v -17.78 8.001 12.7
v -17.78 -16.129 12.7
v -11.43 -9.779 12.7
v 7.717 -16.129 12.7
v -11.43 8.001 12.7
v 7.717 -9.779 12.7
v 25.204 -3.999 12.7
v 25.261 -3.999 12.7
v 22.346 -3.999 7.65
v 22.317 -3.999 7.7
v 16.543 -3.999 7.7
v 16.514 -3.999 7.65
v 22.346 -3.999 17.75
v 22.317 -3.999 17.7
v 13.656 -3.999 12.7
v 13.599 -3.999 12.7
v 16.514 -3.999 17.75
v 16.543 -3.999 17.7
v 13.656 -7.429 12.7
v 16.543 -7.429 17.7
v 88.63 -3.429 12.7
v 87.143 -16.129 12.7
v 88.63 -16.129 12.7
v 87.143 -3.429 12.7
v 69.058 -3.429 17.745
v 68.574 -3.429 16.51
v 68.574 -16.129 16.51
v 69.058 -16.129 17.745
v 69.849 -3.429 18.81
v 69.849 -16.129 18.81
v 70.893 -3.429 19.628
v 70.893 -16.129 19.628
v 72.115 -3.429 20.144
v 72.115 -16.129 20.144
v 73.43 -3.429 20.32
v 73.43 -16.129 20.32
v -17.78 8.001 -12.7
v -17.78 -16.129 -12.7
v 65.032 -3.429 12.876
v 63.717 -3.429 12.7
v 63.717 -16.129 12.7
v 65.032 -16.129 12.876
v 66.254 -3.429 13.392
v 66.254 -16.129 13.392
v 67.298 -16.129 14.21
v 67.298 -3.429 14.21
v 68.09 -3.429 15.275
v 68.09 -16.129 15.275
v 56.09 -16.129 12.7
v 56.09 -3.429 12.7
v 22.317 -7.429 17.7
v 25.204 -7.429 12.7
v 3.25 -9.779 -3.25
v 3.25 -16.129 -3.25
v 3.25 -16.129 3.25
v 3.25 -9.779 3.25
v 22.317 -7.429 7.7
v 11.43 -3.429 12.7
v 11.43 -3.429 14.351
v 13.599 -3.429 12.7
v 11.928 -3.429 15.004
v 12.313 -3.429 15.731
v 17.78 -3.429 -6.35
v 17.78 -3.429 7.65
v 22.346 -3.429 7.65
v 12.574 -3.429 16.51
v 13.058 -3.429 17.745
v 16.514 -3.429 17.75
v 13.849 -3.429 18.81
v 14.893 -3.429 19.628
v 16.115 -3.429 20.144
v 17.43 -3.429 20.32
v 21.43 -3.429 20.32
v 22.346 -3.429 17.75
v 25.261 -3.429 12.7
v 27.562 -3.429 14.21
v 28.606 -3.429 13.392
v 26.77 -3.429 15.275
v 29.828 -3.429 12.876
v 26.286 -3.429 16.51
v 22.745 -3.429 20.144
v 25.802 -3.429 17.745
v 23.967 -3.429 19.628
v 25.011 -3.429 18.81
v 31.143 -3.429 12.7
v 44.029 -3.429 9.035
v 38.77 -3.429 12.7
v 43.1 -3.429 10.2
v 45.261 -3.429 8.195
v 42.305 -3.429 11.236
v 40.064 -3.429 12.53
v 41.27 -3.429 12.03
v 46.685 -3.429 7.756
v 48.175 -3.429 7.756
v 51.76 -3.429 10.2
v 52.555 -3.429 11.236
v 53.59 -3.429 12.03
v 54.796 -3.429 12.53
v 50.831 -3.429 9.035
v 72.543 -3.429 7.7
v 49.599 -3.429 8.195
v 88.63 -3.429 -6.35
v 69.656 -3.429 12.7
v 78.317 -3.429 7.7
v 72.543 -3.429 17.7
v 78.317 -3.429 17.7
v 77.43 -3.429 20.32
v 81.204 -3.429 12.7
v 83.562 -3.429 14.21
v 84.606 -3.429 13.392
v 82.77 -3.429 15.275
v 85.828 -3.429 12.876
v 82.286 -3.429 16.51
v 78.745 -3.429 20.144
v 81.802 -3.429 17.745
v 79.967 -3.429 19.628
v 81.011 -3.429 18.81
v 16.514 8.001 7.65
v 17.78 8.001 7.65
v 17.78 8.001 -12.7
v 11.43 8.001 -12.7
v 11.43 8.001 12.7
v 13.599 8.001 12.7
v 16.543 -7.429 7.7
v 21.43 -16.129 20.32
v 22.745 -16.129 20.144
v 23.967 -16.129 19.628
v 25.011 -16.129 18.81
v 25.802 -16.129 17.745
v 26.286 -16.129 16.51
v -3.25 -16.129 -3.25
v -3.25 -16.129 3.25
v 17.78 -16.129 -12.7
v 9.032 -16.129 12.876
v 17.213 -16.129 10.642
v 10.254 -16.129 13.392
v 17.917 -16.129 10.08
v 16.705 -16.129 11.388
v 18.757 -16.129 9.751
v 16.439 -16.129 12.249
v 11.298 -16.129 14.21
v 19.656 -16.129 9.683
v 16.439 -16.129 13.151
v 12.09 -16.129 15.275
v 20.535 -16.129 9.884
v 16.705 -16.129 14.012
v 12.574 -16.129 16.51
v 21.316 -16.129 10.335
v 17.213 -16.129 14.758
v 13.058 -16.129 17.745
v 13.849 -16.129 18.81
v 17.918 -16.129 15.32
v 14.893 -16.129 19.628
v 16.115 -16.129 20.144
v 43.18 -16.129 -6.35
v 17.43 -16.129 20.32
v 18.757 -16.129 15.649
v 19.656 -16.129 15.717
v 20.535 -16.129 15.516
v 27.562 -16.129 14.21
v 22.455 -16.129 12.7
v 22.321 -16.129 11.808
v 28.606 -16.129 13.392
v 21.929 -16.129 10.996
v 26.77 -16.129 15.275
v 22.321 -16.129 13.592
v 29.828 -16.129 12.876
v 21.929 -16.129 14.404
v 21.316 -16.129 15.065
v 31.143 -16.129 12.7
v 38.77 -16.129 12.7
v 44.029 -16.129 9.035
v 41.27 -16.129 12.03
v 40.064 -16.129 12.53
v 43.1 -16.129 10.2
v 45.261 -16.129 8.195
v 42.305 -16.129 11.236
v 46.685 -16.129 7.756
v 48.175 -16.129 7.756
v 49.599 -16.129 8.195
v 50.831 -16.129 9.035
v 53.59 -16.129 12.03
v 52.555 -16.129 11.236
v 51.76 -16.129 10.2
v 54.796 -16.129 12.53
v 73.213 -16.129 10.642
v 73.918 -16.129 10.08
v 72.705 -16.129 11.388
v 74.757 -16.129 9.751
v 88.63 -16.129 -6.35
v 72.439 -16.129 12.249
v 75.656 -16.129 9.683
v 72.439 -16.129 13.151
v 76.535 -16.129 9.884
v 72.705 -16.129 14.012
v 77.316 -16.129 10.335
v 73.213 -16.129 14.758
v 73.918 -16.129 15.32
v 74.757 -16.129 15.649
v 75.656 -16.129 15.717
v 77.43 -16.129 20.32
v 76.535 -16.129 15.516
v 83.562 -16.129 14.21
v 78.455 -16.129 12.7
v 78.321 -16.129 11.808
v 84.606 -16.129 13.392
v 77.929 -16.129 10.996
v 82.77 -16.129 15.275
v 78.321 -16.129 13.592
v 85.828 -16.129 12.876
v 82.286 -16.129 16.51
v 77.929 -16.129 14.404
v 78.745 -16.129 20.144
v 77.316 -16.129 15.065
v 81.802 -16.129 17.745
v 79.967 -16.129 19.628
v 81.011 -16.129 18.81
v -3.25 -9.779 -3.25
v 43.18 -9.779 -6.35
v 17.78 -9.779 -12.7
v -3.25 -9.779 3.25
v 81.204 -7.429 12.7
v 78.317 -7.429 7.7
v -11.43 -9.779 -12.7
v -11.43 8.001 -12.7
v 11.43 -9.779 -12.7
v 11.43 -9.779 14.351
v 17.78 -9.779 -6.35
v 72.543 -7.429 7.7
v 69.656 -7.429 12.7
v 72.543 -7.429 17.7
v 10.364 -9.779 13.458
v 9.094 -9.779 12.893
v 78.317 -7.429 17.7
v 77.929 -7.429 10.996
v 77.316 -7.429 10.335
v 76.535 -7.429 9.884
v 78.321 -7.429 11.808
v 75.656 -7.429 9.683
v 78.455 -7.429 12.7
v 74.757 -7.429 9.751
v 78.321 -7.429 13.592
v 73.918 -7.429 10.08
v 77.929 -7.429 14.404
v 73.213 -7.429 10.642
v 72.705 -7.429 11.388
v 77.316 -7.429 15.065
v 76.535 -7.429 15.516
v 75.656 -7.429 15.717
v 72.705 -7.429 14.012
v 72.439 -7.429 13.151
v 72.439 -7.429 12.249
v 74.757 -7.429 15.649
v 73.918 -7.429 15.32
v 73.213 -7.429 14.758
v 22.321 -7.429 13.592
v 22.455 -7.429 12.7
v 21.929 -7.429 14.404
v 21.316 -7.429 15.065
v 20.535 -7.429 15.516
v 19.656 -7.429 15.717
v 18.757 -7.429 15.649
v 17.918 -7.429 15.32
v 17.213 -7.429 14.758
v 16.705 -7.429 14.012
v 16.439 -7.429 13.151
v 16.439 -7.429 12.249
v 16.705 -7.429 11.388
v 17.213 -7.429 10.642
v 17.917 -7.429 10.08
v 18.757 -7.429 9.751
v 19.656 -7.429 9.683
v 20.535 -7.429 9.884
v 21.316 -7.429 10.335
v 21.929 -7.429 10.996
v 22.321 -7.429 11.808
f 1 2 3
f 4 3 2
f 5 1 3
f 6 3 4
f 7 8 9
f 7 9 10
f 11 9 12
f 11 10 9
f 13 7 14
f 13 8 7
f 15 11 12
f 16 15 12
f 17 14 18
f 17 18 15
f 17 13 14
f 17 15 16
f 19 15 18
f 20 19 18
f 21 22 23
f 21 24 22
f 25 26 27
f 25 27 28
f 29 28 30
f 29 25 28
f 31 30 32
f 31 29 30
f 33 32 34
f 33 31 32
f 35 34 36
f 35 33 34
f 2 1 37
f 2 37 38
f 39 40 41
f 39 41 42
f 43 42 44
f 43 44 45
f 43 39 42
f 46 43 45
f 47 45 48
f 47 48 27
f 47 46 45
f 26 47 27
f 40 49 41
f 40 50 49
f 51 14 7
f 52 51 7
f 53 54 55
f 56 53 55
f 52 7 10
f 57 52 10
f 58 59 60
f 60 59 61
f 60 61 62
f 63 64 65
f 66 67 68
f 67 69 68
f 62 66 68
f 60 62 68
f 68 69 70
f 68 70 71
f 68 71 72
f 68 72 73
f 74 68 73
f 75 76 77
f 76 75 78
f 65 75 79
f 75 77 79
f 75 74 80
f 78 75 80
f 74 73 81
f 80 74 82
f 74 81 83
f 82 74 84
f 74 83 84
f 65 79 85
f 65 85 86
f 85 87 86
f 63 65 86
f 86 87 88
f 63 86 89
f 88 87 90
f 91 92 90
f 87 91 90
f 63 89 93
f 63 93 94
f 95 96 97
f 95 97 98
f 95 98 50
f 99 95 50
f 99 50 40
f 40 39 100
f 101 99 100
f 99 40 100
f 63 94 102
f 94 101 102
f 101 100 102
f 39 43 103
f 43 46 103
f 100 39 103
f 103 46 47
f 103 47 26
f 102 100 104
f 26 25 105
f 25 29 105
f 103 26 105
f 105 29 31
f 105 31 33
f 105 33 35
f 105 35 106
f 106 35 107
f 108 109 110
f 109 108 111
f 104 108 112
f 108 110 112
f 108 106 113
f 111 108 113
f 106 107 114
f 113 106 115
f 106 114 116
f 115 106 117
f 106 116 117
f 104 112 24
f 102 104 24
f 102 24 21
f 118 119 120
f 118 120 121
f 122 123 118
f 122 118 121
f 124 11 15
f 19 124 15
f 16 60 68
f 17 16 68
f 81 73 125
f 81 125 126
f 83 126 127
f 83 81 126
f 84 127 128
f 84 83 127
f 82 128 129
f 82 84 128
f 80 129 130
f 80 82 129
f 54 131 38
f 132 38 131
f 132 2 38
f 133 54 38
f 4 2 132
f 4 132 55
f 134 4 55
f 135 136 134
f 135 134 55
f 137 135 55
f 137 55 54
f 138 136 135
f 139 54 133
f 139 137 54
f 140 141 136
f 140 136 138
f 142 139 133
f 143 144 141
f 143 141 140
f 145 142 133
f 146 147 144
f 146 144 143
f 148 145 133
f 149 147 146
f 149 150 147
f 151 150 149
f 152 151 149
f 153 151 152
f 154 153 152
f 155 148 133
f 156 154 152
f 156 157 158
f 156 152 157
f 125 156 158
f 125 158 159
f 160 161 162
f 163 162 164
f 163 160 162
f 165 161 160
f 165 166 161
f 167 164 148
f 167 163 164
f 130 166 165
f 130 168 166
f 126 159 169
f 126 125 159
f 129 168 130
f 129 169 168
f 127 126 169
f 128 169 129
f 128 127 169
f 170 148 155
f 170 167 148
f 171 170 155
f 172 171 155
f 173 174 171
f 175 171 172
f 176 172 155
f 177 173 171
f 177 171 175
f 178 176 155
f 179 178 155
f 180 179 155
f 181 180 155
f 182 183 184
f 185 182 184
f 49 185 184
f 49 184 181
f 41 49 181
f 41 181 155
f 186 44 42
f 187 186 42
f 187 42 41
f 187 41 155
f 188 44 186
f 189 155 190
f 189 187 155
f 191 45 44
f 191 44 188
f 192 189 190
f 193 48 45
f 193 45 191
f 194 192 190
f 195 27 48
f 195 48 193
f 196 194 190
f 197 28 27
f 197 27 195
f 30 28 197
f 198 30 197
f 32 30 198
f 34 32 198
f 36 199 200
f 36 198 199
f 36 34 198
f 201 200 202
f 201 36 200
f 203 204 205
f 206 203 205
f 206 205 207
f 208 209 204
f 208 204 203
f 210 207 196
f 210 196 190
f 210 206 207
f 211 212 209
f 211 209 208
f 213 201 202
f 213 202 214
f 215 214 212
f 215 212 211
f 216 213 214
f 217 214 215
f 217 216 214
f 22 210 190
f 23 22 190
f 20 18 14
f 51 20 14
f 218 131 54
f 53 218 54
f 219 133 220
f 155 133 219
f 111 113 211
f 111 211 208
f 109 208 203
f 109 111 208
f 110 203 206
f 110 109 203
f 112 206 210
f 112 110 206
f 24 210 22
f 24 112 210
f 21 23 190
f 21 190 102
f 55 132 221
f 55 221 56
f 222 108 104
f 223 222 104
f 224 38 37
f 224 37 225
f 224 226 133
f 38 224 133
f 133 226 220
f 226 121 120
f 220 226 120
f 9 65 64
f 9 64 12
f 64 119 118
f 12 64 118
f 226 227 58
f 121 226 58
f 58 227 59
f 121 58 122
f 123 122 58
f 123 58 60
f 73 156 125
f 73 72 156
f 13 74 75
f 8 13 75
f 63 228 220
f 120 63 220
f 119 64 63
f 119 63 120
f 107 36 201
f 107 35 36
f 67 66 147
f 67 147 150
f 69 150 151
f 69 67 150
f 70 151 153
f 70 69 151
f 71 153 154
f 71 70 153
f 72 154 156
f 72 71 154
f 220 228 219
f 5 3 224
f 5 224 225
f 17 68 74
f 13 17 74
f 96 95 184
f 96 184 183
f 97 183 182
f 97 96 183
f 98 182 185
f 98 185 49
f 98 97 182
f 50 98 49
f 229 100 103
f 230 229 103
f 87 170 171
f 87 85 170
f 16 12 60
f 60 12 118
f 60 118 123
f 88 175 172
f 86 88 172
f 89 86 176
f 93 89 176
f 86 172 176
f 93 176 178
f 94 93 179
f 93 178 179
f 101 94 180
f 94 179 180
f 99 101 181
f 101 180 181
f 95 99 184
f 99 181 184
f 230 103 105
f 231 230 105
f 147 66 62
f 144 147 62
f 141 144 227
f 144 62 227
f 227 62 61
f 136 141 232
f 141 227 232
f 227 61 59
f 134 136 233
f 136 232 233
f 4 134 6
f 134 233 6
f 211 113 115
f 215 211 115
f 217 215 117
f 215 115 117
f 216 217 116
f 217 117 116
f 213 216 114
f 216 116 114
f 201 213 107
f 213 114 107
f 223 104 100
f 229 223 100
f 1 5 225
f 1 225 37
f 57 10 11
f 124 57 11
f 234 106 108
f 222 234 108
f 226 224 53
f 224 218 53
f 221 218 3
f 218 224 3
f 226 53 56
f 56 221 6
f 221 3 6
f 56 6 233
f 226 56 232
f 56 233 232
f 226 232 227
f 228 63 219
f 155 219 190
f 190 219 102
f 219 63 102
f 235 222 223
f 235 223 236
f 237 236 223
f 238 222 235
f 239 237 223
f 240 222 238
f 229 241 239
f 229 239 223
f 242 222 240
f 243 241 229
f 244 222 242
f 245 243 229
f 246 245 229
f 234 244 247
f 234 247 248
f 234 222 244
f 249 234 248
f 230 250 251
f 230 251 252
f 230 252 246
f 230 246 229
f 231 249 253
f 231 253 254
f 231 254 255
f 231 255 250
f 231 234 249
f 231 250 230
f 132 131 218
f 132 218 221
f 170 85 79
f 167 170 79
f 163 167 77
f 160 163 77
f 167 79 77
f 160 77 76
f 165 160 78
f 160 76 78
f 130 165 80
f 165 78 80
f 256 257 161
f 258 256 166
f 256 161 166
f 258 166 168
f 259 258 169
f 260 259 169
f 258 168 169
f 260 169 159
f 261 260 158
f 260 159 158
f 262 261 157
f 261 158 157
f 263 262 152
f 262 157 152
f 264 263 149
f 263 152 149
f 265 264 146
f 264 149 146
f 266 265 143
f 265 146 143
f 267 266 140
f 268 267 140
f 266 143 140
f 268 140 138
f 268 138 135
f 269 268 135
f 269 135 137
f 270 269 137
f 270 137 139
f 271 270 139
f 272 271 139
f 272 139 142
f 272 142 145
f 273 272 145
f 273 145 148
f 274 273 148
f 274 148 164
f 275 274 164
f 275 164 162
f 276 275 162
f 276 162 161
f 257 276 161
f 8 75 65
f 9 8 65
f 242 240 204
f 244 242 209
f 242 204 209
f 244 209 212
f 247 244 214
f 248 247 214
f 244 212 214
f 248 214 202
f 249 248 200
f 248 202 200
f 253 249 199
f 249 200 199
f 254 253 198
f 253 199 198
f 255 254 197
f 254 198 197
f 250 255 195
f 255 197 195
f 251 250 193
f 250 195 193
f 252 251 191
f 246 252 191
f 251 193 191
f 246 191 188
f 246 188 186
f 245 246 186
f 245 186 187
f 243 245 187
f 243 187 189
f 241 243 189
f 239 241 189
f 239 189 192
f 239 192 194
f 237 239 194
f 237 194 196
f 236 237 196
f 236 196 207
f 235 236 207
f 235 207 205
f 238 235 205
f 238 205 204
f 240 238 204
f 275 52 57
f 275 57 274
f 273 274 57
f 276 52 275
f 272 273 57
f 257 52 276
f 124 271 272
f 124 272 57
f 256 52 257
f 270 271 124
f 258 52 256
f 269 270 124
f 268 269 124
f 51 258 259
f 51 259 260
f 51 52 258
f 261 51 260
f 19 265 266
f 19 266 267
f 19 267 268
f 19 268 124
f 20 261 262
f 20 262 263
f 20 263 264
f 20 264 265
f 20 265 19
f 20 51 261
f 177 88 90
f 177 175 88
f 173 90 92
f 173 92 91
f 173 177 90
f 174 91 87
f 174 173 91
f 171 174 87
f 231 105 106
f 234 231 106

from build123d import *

# Parameters (mm, degrees)
F1_DEPTH      = 12.7
F2_R          = 3.25
F3_DEPTH      = 24.131
F4_W          = 6.5
F4_H          = 6.5
F5_DEPTH      = 7.62
F6_W          = 70.85
F6_H          = 12.7
F7_DEPTH      = 19.05
F9_DEPTH      = 6.35
F10_W         = 14
F10_H         = 12.7
F11_DEPTH     = 7.62
F12_R         = 5
F13_R         = 3.025
F14_DEPTH     = 24.131
F15_R         = 5
F16_DEPTH     = 24.131
F17_R         = 5
F19_DEPTH     = 4
F20_T1_DEPTH  = 12.7
F20_T6_DEPTH  = 12.7
F20_T12_DEPTH = 12.7
F20_T18_DEPTH = 12.7
F20_T21_DEPTH = 31.0012701892
F22_DEPTH     = 12


# Not quite as in the source:
# - a fillet or chamfer that OpenCascade refuses, or shapes differently, is made with other operations: its cross-section is extruded or revolved along the edge and cut away or added


with BuildPart() as f1:
    # F0 (on Top) → F1 (new body, symmetric)
    with BuildSketch(Plane.XY):
        Polygon((11.43, 8.001), (11.43, -9.779), (4.826, -9.779), (-7.366, -9.779), (-11.43, -9.779), (-11.43, 8.001), (-17.78, 8.001), (-17.78, -16.129), (17.78, -16.129), (17.78, 8.001), align=None)
    extrude(amount=F1_DEPTH, both=True)

    # F2 (on face) → F3 (cut, through all)
    with BuildSketch(Plane.XZ.offset(16.129)):
        Circle(F2_R)
    extrude(amount=-F3_DEPTH, mode=Mode.SUBTRACT)

    # F4 (on face) → F5 (cut)
    with BuildSketch(Plane.XZ.offset(16.129)):
        Rectangle(F4_W, F4_H)
    extrude(amount=-F5_DEPTH, mode=Mode.SUBTRACT)

    # F6 (on face) → F7 (join)
    with BuildSketch(Plane.XY.offset(12.7)):
        with Locations((53.205, -9.779)):
            Rectangle(F6_W, F6_H)
    extrude(amount=-F7_DEPTH)

    # F8 (on face) → F9 (join)
    with BuildSketch(Plane.XZ.offset(16.129)):
        Polygon((17.78, -6.35), (17.78, -12.7), (43.18, -6.35), align=None)
    extrude(amount=-F9_DEPTH)

    # F10 (on face) → F11 (join)
    with BuildSketch(Plane.XY.offset(12.7)):
        with Locations((19.43, -9.779)):
            Rectangle(F10_W, F10_H)
        with Locations((75.43, -9.779)):
            Rectangle(F10_W, F10_H)
    extrude(amount=F11_DEPTH)

    # F12
    f12_edges = [f1.edges().sort_by_distance(p)[0] for p in [
        (26.43, -9.779, 20.32),
        (12.43, -9.779, 20.32),
        (68.43, -9.779, 20.32),
        (82.43, -9.779, 20.32),
    ]]
    fillet(f12_edges, radius=F12_R)

    # F13 (on face) → F14 (cut, through all)
    with BuildSketch(Plane.XZ.offset(16.129)):
        with Locations((19.43, 12.7)):
            Circle(F13_R)
        with Locations((75.43, 12.7)):
            Circle(F13_R)
    extrude(amount=-F14_DEPTH, mode=Mode.SUBTRACT)

    # F15 (on face) → F16 (cut, through all)
    with BuildSketch(Plane.XZ.offset(16.129)):
        with Locations((47.43, 12.7)):
            Circle(F15_R)
    extrude(amount=-F16_DEPTH, mode=Mode.SUBTRACT)

    # F17
    f17_edges = [f1.edges().sort_by_distance(p)[0] for p in [
        (42.43, -9.779, 12.7),
    ]]
    fillet(f17_edges, radius=F17_R)

    # F18 (on face) → F19 (cut)
    with BuildSketch(Plane(origin=(0, -3.429, 0), x_dir=(-1, 0, 0), z_dir=(0, 1, 0))):
        Polygon((-69.6564973081, 12.7), (-72.5432486541, 17.7), (-78.3167513459, 17.7), (-81.2035026919, 12.7), (-78.3167513459, 7.7), (-72.5432486541, 7.7), align=None)
        Polygon((-25.2035026919, 12.7), (-22.3167513459, 7.7), (-16.5432486541, 7.7), (-13.6564973081, 12.7), (-16.5432486541, 17.7), (-22.3167513459, 17.7), align=None)
    extrude(amount=-F19_DEPTH, mode=Mode.SUBTRACT)

    # F20: fillet of radius 5 on 5 edges, made by hand

    # F20_s2 → F20_t1 (join)
    with BuildSketch(Plane.XZ.offset(3.429)):
        with BuildLine():
            ThreePointArc((82.2863257716, 16.51), (84.0563916708, 13.7661723474), (87.1426515432, 12.7))
            Line((87.1426515432, 12.7), (87.1426515432, 12.2))
            Line((87.1426515432, 12.2), (82.43, 12.2))
            Line((82.43, 12.2), (81.93, 12.7))
            ThreePointArc((81.93, 12.7), (81.93, 15.32), (81.8006931944, 16.391))
            Line((81.8006931944, 16.391), (82.2863257716, 16.51))
        make_face()
        with BuildLine():
            ThreePointArc((63.7173484568, 12.7), (66.8036083292, 13.7661723474), (68.5736742284, 16.51))
            Line((68.5736742284, 16.51), (69.0593068056, 16.391))
            ThreePointArc((69.0593068056, 16.391), (68.93, 15.32), (68.93, 12.7))
            Line((68.93, 12.7), (68.43, 12.2))
            Line((68.43, 12.2), (63.7173484568, 12.2))
            Line((63.7173484568, 12.2), (63.7173484568, 12.7))
        make_face()
        with BuildLine():
            ThreePointArc((31.1426515432, 12.7), (28.0563916708, 13.7661723474), (26.2863257716, 16.51))
            Line((26.2863257716, 16.51), (25.8006931944, 16.391))
            ThreePointArc((25.8006931944, 16.391), (25.93, 15.32), (25.93, 12.7))
            Line((25.93, 12.7), (26.43, 12.2))
            Line((26.43, 12.2), (31.1426515432, 12.2))
            Line((31.1426515432, 12.2), (31.1426515432, 12.7))
        make_face()
    extrude(amount=F20_T1_DEPTH)


with BuildPart() as f20_tool4:
    # F20_s5 → F20_t6 (new body)
    with BuildSketch(Plane.XZ.offset(3.429)):
        with BuildLine():
            ThreePointArc((12.5736742284, 16.51), (10.8036083292, 13.7661723474), (7.7173484568, 12.7))
            Line((7.7173484568, 12.7), (7.7173484568, 12.2))
            Line((7.7173484568, 12.2), (12.43, 12.2))
            Line((12.43, 12.2), (12.93, 12.7))
            ThreePointArc((12.93, 12.7), (12.93, 15.32), (13.0593068056, 16.391))
            Line((13.0593068056, 16.391), (12.5736742284, 16.51))
        make_face()
    extrude(amount=F20_T6_DEPTH)

    split(bisect_by=Plane.XZ.offset(9.779), keep=Keep.BOTTOM)

    split(bisect_by=Plane.YZ.offset(11.43), keep=Keep.TOP)


with BuildPart() as f1_1:
    add(f1.part)

    # F20_t3: union F20_tool4
    add(f20_tool4.part)


with BuildPart() as f20_tool10:
    # F20_s11 → F20_t12 (new body)
    with BuildSketch(Plane.XZ.offset(3.429)):
        with BuildLine():
            ThreePointArc((12.5736742284, 16.51), (10.8036083292, 13.7661723474), (7.7173484568, 12.7))
            Line((7.7173484568, 12.7), (7.7173484568, 12.2))
            Line((7.7173484568, 12.2), (12.43, 12.2))
            Line((12.43, 12.2), (12.93, 12.7))
            ThreePointArc((12.93, 12.7), (12.93, 15.32), (13.0593068056, 16.391))
            Line((13.0593068056, 16.391), (12.5736742284, 16.51))
        make_face()
    extrude(amount=F20_T12_DEPTH)

    split(bisect_by=Plane.XZ.offset(9.779), keep=Keep.TOP)

    split(bisect_by=Plane.YZ.offset(11.43), keep=Keep.TOP)


with BuildPart() as f1_2:
    add(f1_1.part)

    # F20_t9: union F20_tool10
    add(f20_tool10.part)


with BuildPart() as f20_tool16:
    # F20_s17 → F20_t18 (new body)
    with BuildSketch(Plane.XZ.offset(3.429)):
        with BuildLine():
            ThreePointArc((12.5736742284, 16.51), (10.8036083292, 13.7661723474), (7.7173484568, 12.7))
            Line((7.7173484568, 12.7), (7.7173484568, 12.2))
            Line((7.7173484568, 12.2), (12.43, 12.2))
            Line((12.43, 12.2), (12.93, 12.7))
            ThreePointArc((12.93, 12.7), (12.93, 15.32), (13.0593068056, 16.391))
            Line((13.0593068056, 16.391), (12.5736742284, 16.51))
        make_face()
    extrude(amount=F20_T18_DEPTH)

    split(bisect_by=Plane.XZ.offset(9.779), keep=Keep.TOP)

    split(bisect_by=Plane.YZ.offset(11.43), keep=Keep.BOTTOM)


with BuildPart() as f1_3:
    add(f1_2.part)

    # F20_t15: union F20_tool16
    add(f20_tool16.part)

    # F20_s22 → F20_t21 (cut)
    with BuildSketch(Plane.XZ.offset(-5.7216350946)):
        with BuildLine():
            ThreePointArc((51.7601270189, 10.2), (53.5902540378, 12.0301270189), (56.0902540378, 12.7))
            Line((56.0902540378, 12.7), (52.43, 12.7))
            ThreePointArc((52.43, 12.7), (52.2596291314, 11.4059047745), (51.7601270189, 10.2))
        make_face()
    extrude(amount=F20_T21_DEPTH, mode=Mode.SUBTRACT)

    # F21 (on face) → F22 (cut)
    with BuildSketch(Plane(origin=(0, 8.001, 0), x_dir=(-1, 0, 0), z_dir=(0, 1, 0))):
        Polygon((-22.3456188594, 7.65), (-16.5143811406, 7.65), (-13.5987622812, 12.7), (-16.5143811406, 17.75), (-22.3456188594, 17.75), (-25.2612377188, 12.7), align=None)
    extrude(amount=-F22_DEPTH, mode=Mode.SUBTRACT)


solid = f1_3.part
